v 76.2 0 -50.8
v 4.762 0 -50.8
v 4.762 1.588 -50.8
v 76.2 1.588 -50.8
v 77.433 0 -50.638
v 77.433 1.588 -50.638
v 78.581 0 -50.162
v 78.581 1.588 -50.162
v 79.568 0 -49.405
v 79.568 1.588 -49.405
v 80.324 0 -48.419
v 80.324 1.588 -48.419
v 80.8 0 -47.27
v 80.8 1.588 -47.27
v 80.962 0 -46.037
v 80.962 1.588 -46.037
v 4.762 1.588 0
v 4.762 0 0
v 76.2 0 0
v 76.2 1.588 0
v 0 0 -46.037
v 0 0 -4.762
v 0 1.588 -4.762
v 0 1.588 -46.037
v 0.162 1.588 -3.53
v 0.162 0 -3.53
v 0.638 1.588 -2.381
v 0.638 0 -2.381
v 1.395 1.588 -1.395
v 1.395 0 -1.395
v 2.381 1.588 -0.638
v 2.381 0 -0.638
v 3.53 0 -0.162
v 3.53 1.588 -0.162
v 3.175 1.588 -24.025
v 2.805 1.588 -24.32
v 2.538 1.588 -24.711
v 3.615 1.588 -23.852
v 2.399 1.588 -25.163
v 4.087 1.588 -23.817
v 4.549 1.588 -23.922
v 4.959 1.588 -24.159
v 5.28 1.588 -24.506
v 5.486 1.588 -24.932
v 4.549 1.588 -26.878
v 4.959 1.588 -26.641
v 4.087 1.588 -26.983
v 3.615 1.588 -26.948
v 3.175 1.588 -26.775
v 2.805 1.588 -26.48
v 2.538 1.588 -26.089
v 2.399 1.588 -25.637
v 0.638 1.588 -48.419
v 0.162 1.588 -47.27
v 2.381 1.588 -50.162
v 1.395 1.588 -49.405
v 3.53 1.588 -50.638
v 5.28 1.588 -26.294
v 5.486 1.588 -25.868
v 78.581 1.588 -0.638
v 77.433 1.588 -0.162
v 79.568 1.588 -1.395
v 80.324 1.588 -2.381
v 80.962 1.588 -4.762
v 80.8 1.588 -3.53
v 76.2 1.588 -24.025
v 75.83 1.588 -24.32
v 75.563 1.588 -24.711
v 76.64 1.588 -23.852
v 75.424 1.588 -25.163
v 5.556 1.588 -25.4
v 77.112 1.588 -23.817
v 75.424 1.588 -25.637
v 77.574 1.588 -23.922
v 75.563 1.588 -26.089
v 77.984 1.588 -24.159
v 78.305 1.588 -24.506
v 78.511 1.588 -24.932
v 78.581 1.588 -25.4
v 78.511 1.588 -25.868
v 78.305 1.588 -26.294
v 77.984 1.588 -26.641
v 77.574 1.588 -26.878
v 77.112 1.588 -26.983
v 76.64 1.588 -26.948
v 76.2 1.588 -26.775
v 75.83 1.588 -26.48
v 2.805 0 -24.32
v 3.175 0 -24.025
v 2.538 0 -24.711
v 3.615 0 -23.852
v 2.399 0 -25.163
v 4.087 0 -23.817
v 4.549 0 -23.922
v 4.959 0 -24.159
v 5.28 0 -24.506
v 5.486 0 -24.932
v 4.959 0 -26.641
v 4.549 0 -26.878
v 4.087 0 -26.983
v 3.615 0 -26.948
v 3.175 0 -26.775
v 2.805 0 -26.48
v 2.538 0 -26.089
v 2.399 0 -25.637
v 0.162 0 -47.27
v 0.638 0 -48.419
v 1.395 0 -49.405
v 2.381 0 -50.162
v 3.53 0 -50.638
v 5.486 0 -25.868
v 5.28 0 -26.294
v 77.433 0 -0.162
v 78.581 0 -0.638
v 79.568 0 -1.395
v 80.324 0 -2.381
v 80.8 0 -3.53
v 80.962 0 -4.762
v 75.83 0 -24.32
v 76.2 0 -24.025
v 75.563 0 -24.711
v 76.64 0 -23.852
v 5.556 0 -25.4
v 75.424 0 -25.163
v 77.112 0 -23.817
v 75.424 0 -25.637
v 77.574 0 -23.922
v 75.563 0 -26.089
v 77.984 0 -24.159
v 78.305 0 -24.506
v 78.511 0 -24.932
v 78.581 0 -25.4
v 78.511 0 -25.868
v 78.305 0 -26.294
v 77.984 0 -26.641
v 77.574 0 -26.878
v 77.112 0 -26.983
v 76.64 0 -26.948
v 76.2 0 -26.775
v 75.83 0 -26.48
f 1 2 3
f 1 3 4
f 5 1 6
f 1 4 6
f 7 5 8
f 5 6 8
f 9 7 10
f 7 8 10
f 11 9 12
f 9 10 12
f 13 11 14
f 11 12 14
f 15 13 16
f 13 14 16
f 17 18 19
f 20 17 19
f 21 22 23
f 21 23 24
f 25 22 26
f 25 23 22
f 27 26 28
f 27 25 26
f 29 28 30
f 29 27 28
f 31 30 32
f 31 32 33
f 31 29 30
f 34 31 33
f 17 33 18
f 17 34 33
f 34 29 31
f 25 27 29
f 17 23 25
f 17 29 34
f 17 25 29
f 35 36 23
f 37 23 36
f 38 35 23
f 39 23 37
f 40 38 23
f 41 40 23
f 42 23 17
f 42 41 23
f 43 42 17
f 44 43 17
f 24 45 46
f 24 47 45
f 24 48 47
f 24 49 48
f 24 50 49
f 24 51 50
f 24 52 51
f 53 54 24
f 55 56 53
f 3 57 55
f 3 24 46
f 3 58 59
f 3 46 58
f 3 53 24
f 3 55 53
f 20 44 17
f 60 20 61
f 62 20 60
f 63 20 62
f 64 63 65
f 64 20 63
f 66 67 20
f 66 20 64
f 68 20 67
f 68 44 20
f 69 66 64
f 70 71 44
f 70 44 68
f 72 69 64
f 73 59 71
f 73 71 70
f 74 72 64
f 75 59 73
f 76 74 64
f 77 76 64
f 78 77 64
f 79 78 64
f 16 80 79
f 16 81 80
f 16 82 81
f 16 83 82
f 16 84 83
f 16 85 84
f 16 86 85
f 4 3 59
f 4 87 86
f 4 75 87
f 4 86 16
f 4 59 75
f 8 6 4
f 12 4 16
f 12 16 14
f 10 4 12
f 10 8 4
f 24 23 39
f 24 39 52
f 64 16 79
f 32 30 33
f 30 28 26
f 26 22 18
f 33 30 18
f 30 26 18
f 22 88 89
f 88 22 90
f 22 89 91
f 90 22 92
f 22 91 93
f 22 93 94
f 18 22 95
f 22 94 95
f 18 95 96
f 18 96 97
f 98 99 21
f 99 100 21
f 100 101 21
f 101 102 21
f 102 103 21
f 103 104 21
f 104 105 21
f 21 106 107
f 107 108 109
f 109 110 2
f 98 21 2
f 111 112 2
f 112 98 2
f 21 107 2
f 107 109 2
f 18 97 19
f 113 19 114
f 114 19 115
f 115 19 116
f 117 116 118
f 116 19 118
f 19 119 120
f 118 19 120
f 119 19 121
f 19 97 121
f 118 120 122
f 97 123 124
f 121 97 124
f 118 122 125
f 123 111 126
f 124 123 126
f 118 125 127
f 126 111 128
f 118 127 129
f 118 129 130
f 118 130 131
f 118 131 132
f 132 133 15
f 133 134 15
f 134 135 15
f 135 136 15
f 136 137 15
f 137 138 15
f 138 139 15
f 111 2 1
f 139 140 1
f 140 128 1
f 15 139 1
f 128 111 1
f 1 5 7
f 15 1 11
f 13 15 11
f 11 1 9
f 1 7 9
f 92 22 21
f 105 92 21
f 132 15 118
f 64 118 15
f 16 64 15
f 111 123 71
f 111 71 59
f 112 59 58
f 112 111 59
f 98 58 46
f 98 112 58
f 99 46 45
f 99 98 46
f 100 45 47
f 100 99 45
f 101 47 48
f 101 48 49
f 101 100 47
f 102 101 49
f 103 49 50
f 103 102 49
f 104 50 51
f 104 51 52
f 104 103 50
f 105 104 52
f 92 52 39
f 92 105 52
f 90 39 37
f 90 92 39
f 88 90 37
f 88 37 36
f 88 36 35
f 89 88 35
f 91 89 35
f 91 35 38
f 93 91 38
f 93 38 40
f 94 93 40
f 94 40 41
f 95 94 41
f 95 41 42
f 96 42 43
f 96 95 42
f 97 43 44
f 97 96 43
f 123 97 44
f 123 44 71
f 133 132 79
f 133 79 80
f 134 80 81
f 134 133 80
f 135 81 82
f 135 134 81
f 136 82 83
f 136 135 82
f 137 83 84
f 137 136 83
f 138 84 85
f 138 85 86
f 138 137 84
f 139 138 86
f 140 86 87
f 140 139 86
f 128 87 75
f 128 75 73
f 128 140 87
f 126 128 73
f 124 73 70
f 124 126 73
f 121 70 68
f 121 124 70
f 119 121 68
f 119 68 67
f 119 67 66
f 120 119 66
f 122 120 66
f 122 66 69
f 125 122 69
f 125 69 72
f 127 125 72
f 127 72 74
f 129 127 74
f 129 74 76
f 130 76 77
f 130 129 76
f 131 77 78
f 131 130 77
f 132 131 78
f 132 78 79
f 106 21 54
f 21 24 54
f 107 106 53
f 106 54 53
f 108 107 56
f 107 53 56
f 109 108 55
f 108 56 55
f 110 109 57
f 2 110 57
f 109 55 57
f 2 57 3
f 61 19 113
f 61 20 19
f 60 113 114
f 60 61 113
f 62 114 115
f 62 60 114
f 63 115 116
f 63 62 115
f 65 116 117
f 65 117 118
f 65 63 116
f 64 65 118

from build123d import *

# Parameters (mm, degrees)
SKETCH1_W           = 80.9625
SKETCH1_H           = 50.8
SKETCH1_R           = 1.5875
BOSS_EXTRUDE1_DEPTH = 1.5875
FILLET1_R           = 4.7625


with BuildPart() as part:
    # Sketch1 → Boss-Extrude1 (new body)
    with BuildSketch(Plane(origin=(0, 0, 0), x_dir=(1, 0, 0), z_dir=(0, 1, 0))):
        with Locations((40.48125, 25.4)):
            Rectangle(SKETCH1_W, SKETCH1_H)
        with Locations((3.96875, 25.4)):
            Circle(SKETCH1_R, mode=Mode.SUBTRACT)
        with Locations((76.99375, 25.4)):
            Circle(SKETCH1_R, mode=Mode.SUBTRACT)
    extrude(amount=BOSS_EXTRUDE1_DEPTH)

    # Fillet1
    fillet1_edges = [part.edges().sort_by_distance(p)[0] for p in [
        (0, 0.79375, -50.8),
        (80.9625, 0.79375, -50.8),
        (80.9625, 0.79375, 0),
        (0, 0.79375, 0),
    ]]
    fillet(fillet1_edges, radius=FILLET1_R)


solid = part.part
